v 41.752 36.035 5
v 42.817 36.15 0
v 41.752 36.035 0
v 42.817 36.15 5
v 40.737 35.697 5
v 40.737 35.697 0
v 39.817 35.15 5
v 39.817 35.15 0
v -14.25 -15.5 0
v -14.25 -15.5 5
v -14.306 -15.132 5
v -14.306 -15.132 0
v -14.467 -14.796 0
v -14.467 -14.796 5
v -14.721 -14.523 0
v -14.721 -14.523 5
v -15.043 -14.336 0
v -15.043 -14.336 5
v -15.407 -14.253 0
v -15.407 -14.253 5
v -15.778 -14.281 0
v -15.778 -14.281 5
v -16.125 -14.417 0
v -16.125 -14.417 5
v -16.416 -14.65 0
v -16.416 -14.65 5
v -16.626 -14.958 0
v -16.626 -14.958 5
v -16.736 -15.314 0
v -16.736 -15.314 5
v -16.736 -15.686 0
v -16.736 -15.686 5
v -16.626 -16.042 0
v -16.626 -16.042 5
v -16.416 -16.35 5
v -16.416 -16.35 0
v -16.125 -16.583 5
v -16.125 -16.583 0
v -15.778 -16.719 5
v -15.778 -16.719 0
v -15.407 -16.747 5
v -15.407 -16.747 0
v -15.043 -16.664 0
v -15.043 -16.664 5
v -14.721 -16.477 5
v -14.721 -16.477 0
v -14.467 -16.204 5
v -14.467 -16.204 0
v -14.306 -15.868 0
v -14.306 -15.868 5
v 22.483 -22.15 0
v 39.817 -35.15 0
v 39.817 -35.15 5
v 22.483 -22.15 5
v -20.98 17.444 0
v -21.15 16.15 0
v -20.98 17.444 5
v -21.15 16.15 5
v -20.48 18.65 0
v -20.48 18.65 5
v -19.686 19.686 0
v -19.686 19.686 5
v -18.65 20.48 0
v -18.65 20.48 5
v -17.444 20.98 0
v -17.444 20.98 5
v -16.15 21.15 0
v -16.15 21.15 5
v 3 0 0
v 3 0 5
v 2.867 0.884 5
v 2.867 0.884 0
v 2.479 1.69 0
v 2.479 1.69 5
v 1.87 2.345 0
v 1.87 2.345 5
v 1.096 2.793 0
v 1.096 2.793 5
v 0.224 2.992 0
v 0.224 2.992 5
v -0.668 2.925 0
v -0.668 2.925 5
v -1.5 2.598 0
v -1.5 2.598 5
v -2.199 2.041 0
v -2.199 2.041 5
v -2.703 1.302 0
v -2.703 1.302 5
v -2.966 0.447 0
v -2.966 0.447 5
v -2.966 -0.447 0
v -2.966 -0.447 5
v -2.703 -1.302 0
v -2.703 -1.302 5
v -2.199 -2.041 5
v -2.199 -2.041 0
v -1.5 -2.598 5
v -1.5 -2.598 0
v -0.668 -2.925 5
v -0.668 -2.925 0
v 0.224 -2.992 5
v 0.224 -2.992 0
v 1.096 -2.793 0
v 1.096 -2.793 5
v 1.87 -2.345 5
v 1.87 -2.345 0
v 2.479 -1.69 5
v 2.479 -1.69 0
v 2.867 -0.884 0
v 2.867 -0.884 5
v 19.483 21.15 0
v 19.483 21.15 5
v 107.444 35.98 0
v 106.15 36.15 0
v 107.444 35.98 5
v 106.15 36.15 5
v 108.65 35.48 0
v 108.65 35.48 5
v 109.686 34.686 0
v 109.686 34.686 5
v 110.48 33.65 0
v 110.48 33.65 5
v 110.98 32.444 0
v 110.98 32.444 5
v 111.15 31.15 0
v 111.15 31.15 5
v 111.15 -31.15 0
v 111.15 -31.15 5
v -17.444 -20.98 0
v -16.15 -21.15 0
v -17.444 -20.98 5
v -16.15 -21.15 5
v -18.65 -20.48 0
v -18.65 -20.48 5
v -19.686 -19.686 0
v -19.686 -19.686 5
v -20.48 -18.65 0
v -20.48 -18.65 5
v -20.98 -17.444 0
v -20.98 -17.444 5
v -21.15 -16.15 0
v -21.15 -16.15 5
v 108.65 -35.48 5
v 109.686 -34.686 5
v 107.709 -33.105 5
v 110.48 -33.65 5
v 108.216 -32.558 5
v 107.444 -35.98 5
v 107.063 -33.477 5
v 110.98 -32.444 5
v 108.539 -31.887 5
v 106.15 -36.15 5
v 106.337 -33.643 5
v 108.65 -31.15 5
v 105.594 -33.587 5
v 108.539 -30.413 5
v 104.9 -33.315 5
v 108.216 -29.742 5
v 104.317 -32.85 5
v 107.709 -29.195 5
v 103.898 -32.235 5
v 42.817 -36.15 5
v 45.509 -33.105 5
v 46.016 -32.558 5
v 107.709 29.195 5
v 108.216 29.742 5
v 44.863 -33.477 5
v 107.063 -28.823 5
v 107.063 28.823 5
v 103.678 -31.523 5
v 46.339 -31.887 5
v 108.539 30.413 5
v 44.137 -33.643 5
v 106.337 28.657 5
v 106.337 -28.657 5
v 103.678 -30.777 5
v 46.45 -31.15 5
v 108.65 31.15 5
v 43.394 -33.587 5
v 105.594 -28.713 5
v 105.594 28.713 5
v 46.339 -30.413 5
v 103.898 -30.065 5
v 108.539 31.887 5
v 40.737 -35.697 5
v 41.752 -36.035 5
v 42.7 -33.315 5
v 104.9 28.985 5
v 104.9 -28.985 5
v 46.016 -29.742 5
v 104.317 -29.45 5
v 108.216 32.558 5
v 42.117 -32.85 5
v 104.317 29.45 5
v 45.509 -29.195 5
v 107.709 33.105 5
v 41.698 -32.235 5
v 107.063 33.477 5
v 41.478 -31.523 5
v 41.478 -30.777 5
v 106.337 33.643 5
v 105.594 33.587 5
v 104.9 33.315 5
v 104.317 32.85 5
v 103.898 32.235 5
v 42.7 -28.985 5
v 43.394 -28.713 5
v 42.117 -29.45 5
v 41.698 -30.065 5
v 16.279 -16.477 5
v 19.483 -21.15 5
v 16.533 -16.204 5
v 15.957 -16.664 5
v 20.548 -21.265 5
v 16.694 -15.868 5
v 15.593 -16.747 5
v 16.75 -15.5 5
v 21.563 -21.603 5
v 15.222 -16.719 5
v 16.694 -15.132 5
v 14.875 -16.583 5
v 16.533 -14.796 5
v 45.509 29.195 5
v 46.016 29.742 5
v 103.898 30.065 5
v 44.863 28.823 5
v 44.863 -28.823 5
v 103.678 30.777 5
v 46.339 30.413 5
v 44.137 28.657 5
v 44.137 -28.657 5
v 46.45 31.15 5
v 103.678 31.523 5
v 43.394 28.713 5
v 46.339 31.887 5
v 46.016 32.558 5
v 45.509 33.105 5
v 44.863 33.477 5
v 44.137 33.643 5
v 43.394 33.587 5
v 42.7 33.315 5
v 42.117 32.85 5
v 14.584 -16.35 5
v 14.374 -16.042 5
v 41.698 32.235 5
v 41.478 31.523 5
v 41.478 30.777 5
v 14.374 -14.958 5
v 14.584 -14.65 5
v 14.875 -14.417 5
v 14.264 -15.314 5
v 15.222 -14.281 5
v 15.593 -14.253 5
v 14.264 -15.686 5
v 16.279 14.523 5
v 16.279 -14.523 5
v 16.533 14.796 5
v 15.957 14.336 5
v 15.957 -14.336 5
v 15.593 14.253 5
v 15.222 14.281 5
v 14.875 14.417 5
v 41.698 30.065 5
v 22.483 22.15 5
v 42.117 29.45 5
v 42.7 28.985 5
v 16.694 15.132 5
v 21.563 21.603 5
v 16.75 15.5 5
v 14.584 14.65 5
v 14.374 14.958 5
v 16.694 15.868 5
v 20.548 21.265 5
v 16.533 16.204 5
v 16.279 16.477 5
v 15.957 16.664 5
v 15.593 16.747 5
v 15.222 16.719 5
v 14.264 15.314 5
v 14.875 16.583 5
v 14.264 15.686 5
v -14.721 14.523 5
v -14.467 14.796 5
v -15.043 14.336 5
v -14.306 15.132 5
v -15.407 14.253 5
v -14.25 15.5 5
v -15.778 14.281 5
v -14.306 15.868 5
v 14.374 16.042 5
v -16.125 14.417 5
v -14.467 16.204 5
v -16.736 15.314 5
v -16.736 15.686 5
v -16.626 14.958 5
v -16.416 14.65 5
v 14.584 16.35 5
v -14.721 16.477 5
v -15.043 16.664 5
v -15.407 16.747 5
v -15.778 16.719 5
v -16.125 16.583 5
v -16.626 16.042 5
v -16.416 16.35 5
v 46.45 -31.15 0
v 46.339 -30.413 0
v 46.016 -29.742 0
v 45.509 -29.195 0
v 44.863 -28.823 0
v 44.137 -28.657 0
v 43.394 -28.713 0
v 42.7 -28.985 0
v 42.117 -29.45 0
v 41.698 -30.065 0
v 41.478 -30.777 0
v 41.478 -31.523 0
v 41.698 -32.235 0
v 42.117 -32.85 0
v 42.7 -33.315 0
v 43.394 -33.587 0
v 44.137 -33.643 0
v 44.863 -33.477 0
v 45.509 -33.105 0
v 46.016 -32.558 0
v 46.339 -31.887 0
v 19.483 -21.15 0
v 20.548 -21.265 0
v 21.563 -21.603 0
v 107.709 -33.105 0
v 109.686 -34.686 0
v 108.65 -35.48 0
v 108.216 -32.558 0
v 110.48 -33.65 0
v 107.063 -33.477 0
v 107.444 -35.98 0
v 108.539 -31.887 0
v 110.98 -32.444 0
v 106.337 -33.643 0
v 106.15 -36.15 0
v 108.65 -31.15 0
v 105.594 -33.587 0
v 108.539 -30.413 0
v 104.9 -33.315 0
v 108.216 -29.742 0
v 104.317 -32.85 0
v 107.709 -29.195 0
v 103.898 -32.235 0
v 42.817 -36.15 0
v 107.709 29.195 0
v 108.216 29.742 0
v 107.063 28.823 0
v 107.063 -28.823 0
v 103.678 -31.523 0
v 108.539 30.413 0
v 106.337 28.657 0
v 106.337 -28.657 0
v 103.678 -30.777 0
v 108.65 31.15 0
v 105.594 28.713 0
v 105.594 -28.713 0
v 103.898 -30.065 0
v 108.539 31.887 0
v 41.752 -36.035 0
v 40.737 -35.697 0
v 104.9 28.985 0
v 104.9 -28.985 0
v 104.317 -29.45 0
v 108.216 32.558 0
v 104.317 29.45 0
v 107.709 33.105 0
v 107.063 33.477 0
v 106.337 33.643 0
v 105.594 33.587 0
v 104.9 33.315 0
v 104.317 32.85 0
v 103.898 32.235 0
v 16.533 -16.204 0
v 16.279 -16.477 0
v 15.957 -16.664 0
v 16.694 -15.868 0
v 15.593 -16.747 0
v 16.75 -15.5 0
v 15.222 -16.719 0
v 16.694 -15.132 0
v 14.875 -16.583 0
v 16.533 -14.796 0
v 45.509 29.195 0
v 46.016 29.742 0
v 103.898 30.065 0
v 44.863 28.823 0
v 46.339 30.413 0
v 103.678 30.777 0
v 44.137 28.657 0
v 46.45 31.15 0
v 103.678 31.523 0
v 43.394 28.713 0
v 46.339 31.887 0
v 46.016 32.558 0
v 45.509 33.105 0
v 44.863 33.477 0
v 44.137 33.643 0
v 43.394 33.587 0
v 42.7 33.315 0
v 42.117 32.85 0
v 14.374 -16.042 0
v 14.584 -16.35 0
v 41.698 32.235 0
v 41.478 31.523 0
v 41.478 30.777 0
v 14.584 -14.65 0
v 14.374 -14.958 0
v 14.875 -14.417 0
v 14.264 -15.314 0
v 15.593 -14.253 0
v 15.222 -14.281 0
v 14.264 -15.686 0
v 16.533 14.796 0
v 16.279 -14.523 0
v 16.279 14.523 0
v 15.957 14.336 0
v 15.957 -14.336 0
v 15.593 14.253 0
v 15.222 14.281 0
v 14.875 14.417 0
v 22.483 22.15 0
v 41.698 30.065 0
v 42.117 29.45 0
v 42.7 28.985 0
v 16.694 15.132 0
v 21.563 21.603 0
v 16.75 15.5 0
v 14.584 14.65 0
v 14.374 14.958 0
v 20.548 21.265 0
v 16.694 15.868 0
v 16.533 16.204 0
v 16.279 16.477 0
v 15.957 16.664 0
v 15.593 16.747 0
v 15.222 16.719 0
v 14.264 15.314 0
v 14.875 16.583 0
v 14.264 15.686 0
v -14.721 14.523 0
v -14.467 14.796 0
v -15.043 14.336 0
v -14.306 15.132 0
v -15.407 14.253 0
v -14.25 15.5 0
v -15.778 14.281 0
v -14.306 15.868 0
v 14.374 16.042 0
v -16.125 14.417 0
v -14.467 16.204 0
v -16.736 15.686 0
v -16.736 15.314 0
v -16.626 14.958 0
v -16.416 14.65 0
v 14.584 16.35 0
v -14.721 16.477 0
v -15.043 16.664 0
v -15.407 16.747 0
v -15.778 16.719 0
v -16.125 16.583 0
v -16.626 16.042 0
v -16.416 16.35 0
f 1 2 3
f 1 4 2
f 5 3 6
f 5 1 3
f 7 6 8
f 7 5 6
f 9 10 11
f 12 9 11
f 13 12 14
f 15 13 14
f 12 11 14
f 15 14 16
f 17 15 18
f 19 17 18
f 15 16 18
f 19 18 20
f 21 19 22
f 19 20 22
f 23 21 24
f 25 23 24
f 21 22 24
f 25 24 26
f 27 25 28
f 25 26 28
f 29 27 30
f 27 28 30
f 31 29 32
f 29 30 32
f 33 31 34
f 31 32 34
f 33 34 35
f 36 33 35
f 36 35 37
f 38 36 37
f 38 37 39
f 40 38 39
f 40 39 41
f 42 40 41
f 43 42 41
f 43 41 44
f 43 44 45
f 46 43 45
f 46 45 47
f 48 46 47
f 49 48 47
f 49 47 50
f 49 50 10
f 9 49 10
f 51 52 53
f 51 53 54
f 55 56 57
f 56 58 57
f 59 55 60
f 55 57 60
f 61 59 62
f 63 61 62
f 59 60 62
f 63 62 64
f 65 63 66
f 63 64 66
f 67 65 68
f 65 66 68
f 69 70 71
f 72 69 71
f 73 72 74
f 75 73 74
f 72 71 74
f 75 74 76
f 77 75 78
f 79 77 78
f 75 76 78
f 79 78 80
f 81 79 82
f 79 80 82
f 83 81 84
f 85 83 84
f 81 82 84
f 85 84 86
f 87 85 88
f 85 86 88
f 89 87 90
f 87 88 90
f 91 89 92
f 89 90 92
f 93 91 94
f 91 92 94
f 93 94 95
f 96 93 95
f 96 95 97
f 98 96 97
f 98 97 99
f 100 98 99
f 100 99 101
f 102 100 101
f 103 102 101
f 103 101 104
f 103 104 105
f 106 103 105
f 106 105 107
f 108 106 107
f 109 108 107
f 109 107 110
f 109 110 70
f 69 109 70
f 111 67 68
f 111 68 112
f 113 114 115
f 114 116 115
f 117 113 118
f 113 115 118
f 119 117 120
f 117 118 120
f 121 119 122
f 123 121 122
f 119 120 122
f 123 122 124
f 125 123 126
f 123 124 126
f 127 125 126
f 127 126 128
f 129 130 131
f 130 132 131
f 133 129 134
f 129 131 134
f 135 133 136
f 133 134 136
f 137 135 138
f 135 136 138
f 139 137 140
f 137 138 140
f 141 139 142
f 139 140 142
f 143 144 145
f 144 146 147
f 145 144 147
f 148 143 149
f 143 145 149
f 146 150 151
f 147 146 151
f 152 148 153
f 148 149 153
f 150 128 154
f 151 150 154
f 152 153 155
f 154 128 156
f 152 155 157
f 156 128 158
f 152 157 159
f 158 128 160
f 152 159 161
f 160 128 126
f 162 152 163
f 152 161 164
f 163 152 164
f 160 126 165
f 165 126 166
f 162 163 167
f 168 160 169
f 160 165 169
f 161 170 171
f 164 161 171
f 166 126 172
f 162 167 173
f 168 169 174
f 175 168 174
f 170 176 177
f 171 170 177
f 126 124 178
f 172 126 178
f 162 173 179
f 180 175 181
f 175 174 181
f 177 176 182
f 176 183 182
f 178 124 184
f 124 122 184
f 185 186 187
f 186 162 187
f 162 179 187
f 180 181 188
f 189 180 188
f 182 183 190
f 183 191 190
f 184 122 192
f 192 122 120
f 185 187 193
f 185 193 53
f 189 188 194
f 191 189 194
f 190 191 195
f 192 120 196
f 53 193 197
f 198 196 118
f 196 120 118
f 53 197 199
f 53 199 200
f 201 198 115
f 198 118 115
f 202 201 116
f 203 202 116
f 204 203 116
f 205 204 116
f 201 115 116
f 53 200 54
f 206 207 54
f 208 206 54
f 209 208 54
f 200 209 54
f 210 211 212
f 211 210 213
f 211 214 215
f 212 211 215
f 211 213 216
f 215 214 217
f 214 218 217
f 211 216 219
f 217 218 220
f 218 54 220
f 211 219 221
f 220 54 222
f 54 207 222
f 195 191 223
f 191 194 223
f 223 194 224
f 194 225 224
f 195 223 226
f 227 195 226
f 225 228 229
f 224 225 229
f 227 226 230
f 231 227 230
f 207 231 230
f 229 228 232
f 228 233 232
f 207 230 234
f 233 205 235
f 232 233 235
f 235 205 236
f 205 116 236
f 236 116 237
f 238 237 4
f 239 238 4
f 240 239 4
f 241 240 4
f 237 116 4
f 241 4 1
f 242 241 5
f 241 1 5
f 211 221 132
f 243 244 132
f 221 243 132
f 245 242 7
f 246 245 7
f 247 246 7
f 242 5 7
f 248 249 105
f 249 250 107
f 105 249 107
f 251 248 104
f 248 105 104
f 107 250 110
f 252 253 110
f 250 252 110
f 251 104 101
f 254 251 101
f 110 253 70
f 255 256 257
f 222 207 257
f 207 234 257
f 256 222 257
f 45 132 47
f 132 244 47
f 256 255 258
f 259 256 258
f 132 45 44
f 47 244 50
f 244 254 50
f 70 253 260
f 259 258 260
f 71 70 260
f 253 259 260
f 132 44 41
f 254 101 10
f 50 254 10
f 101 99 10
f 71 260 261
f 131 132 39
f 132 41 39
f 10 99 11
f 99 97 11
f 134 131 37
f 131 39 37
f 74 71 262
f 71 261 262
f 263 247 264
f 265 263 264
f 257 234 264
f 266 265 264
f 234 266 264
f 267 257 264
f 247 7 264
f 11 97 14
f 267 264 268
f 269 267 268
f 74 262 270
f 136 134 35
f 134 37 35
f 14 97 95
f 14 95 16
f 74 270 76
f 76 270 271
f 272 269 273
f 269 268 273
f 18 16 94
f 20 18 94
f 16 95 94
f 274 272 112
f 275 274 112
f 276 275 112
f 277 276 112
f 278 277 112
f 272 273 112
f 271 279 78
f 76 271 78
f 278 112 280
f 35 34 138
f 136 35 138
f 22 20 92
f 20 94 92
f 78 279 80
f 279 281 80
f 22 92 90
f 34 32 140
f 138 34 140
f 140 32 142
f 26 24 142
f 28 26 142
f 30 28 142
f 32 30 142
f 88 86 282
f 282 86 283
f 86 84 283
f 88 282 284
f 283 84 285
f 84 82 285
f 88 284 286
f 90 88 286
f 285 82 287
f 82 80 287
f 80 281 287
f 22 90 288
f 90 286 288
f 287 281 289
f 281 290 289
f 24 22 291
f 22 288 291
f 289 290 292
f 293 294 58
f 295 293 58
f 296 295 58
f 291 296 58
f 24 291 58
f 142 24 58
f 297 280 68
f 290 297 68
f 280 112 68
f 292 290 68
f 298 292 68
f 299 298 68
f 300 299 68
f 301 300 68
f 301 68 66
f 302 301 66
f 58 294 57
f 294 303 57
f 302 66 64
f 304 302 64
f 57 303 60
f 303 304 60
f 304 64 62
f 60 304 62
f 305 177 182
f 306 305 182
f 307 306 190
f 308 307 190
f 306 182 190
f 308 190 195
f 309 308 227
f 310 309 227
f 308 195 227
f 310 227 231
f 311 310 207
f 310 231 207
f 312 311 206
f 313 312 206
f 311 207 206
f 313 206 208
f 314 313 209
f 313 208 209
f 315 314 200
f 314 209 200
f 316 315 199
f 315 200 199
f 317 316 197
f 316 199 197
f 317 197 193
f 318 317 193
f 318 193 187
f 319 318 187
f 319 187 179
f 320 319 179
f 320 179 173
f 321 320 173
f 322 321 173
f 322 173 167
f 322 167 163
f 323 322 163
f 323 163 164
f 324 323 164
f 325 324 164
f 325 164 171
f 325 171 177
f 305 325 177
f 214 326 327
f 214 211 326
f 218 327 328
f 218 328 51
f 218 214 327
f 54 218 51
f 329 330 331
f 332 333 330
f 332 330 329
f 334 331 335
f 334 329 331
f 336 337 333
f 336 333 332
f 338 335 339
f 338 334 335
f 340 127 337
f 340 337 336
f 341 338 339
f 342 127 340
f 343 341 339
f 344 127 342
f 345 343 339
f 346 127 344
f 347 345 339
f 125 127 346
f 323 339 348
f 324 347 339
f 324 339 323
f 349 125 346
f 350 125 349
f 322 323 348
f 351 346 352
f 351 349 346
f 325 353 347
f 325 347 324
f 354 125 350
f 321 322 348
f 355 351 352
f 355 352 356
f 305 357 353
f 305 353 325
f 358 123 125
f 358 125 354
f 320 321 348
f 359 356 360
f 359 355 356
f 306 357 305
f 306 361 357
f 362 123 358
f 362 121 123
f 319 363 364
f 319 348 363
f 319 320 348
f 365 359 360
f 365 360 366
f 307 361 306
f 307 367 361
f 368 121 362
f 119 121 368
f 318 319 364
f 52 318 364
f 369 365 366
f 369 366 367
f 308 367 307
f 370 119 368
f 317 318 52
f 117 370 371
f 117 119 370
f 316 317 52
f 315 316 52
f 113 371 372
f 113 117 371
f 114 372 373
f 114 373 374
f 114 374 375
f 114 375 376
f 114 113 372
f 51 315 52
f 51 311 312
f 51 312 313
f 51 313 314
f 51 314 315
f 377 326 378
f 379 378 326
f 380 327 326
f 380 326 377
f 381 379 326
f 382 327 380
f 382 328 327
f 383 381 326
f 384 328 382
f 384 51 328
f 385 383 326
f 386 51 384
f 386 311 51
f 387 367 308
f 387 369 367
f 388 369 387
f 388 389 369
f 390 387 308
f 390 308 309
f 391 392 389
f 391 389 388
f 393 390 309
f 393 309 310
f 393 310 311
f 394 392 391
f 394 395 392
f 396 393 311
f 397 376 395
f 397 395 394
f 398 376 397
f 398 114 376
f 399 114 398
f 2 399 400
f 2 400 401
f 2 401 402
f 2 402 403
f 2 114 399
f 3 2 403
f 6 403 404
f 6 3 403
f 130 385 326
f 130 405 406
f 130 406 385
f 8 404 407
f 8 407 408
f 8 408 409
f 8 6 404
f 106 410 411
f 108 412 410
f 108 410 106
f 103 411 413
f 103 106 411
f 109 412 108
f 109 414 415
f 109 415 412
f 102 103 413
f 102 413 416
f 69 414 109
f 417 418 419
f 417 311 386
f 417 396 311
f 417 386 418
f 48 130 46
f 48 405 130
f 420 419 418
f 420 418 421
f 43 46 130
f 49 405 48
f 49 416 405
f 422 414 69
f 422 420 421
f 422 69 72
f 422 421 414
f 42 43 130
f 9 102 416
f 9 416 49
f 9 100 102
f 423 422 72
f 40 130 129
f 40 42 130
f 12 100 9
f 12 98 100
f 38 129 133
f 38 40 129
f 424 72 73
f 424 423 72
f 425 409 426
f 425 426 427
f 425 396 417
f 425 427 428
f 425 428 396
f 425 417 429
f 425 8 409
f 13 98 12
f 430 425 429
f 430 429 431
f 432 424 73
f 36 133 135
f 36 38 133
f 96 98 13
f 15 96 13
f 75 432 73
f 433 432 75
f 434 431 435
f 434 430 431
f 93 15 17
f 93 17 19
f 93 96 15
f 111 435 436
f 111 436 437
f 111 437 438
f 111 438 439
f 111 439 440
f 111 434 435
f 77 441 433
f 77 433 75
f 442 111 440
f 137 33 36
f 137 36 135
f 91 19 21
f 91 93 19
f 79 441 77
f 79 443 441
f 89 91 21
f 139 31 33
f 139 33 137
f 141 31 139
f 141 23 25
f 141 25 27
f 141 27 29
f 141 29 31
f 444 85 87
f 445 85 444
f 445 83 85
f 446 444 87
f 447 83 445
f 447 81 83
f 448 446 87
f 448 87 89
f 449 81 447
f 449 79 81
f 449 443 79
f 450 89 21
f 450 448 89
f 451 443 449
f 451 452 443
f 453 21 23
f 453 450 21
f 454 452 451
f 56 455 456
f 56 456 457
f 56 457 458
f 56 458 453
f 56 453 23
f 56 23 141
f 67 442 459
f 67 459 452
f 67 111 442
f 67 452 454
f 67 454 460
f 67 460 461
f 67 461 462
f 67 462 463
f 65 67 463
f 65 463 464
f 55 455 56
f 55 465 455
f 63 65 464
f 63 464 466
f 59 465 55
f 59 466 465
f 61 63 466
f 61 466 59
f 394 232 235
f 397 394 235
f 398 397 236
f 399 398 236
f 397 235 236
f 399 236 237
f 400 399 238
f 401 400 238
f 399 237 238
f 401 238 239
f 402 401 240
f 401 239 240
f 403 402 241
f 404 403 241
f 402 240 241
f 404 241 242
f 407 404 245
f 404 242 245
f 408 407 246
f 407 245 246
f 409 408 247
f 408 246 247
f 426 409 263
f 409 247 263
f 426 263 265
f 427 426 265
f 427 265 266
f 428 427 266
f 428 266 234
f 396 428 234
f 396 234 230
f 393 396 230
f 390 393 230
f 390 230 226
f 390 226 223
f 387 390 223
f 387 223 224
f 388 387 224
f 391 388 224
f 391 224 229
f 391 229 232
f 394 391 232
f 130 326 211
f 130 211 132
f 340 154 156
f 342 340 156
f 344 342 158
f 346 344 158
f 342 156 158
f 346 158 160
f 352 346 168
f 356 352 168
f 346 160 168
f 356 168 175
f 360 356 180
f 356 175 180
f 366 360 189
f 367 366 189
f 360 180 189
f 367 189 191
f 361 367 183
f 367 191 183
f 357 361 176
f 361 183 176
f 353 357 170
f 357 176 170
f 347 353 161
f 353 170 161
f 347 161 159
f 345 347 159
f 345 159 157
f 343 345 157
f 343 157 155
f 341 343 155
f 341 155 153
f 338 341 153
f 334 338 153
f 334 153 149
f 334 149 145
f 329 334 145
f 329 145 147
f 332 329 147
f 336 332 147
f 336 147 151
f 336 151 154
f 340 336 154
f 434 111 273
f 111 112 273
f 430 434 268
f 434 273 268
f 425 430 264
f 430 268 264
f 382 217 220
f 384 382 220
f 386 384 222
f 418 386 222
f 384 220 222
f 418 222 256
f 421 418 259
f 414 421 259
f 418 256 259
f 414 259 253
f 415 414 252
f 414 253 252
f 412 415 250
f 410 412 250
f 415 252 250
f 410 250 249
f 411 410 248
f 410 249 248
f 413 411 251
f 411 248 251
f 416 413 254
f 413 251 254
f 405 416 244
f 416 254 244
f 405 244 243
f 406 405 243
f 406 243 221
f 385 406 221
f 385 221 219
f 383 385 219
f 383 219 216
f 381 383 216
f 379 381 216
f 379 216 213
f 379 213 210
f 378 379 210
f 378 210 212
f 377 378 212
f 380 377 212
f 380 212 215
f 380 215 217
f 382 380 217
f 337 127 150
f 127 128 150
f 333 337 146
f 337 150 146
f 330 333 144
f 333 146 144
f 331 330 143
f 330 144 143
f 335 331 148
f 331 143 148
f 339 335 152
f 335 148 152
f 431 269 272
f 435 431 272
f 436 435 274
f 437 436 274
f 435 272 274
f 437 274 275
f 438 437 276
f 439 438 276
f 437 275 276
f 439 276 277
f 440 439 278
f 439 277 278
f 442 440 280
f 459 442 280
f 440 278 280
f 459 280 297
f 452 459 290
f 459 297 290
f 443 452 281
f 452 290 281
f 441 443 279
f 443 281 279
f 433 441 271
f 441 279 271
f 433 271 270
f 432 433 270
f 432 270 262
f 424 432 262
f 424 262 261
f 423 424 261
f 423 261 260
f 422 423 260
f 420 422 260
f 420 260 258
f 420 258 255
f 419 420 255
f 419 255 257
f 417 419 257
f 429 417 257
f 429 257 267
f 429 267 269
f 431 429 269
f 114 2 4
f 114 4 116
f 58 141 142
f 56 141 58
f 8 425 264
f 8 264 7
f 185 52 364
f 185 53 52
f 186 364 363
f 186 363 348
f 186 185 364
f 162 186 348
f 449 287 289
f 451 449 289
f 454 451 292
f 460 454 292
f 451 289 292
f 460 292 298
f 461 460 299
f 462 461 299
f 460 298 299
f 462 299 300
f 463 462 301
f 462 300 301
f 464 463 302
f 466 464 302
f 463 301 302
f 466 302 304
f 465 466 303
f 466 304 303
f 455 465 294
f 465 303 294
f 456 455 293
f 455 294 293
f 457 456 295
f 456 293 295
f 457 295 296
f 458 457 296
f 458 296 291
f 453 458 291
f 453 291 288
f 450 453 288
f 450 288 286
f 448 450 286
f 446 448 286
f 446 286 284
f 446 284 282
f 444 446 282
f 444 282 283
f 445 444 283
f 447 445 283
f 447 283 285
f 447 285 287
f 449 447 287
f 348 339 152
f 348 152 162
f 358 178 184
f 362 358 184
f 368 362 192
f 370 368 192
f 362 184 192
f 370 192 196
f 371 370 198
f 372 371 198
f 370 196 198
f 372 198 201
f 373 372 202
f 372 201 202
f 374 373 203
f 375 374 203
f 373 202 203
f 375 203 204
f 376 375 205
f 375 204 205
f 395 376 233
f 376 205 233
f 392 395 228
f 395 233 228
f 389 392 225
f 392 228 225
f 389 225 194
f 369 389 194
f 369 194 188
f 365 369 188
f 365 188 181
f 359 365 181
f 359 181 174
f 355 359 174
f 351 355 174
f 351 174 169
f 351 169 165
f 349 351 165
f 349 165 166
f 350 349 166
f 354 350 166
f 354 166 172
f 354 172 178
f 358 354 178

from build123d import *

# Parameters (mm, degrees)
BOSS_EXTRUDE1_DEPTH = 5
FILLET2_R           = 5
FILLET3_R           = 5
FILLET4_R           = 5
FILLET5_R           = 5
FILLET6_R           = 5
FILLET7_R           = 5
FILLET8_R           = 5
FILLET9_R           = 5
SKETCH2_R           = 1.25
SKETCH2_R_2         = 2.5
SKETCH2_R_3         = 3
CUT_EXTRUDE1_DEPTH  = 10


with BuildPart() as part:
    # Sketch1 → Boss-Extrude1 (new body)
    with BuildSketch(Plane.XY):
        Polygon((21.15, 21.15), (41.15, 36.15), (111.15, 36.15), (111.15, -36.15), (41.15, -36.15), (21.15, -21.15), (-21.15, -21.15), (-21.15, 21.15), align=None)
    extrude(amount=BOSS_EXTRUDE1_DEPTH)

    # Fillet2
    fillet2_edges = [part.edges().sort_by_distance(p)[0] for p in [
        (-21.15, -21.15, 2.5),
    ]]
    fillet(fillet2_edges, radius=FILLET2_R)

    # Fillet3
    fillet3_edges = [part.edges().sort_by_distance(p)[0] for p in [
        (-21.15, 21.15, 2.5),
    ]]
    fillet(fillet3_edges, radius=FILLET3_R)

    # Fillet4
    fillet4_edges = [part.edges().sort_by_distance(p)[0] for p in [
        (21.15, 21.15, 2.5),
    ]]
    fillet(fillet4_edges, radius=FILLET4_R)

    # Fillet5
    fillet5_edges = [part.edges().sort_by_distance(p)[0] for p in [
        (21.15, -21.15, 2.5),
    ]]
    fillet(fillet5_edges, radius=FILLET5_R)

    # Fillet6
    fillet6_edges = [part.edges().sort_by_distance(p)[0] for p in [
        (41.15, -36.15, 2.5),
    ]]
    fillet(fillet6_edges, radius=FILLET6_R)

    # Fillet7
    fillet7_edges = [part.edges().sort_by_distance(p)[0] for p in [
        (41.15, 36.15, 2.5),
    ]]
    fillet(fillet7_edges, radius=FILLET7_R)

    # Fillet8
    fillet8_edges = [part.edges().sort_by_distance(p)[0] for p in [
        (111.15, 36.15, 2.5),
    ]]
    fillet(fillet8_edges, radius=FILLET8_R)

    # Fillet9
    fillet9_edges = [part.edges().sort_by_distance(p)[0] for p in [
        (111.15, -36.15, 2.5),
    ]]
    fillet(fillet9_edges, radius=FILLET9_R)

    # Sketch2 → Cut-Extrude1 (cut)
    with BuildSketch(Plane.XY.offset(5)):
        with Locations((-15.5, -15.5)):
            Circle(SKETCH2_R)
        with Locations((-15.5, 15.5)):
            Circle(SKETCH2_R)
        with Locations((15.5, 15.5)):
            Circle(SKETCH2_R)
        with Locations((15.5, -15.5)):
            Circle(SKETCH2_R)
        with Locations((106.15, 31.15)):
            Circle(SKETCH2_R_2)
        with Locations((106.15, -31.15)):
            Circle(SKETCH2_R_2)
        with Locations((43.95, -31.15)):
            Circle(SKETCH2_R_2)
        with Locations((43.95, 31.15)):
            Circle(SKETCH2_R_2)
        Circle(SKETCH2_R_3)
    extrude(amount=-CUT_EXTRUDE1_DEPTH, mode=Mode.SUBTRACT)


solid = part.part
